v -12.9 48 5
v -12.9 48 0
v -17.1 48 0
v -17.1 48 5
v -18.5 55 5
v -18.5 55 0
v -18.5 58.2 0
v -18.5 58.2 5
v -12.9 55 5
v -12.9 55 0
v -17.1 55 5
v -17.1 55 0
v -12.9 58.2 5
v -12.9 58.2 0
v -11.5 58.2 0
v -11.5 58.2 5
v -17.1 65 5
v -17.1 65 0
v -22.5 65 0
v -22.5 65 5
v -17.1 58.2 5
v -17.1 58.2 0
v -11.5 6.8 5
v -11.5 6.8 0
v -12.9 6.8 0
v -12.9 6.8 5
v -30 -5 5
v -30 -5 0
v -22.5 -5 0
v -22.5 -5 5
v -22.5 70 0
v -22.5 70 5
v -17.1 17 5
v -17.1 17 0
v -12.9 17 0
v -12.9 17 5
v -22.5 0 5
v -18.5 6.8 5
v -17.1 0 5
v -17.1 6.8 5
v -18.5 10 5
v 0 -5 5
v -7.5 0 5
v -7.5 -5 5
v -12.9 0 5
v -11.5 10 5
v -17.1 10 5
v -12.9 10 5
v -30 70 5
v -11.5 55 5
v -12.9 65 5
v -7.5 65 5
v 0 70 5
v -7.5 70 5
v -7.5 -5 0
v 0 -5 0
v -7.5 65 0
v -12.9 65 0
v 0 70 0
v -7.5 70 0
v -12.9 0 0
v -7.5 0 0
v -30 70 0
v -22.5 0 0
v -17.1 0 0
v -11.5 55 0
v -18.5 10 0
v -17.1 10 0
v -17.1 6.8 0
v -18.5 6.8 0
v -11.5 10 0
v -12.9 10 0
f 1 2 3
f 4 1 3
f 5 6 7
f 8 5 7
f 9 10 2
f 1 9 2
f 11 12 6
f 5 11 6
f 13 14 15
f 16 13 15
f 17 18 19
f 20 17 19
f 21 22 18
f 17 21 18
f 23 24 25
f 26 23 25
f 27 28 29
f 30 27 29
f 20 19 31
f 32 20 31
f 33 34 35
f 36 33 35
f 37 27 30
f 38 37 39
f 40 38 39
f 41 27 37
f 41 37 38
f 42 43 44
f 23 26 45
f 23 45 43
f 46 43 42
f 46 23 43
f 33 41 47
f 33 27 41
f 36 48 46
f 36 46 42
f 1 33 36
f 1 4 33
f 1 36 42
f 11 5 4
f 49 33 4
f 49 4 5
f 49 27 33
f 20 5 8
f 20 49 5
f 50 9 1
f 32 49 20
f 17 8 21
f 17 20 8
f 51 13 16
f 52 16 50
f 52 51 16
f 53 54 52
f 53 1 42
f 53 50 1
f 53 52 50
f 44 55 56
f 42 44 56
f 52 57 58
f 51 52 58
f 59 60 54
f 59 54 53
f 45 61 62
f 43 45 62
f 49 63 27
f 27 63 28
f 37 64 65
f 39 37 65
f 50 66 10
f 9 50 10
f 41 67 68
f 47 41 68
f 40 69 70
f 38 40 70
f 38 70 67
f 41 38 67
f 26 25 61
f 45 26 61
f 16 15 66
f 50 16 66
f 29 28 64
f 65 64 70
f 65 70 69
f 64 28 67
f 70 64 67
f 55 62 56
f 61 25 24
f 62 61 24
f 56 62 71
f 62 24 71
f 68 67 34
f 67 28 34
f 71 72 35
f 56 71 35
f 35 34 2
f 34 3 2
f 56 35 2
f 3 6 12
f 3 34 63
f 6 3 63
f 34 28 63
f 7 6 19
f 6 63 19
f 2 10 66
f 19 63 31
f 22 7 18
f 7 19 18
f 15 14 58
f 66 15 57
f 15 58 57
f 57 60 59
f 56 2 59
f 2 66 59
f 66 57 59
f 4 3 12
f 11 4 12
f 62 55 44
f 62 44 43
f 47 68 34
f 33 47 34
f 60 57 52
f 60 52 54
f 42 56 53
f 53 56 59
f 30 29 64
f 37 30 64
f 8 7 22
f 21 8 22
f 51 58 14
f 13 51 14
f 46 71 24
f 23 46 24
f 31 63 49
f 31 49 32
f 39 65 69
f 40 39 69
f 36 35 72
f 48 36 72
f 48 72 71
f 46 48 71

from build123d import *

# Parameters (mm, degrees)
SKETCH1_W           = 7.5
SKETCH1_H           = 5
BOSS_EXTRUDE1_DEPTH = 5


with BuildPart() as part:
    # Sketch1 → Boss-Extrude1 (new body)
    with BuildSketch(Plane.XY):
        Polygon((-7.5, 0), (0, 0), (0, 65), (-7.5, 65), (-12.9, 65), (-12.9, 58.2), (-11.5, 58.2), (-11.5, 55), (-12.9, 55), (-12.9, 48), (-17.1, 48), (-17.1, 55), (-18.5, 55), (-18.5, 58.2), (-17.1, 58.2), (-17.1, 65), (-22.5, 65), (-30, 65), (-30, 0), (-22.5, 0), (-17.1, 0), (-17.1, 6.8), (-18.5, 6.8), (-18.5, 10), (-17.1, 10), (-17.1, 17), (-12.9, 17), (-12.9, 10), (-11.5, 10), (-11.5, 6.8), (-12.9, 6.8), (-12.9, 0), align=None)
        with Locations((-3.75, 67.5)):
            Rectangle(SKETCH1_W, SKETCH1_H)
        with Locations((-26.25, 67.5)):
            Rectangle(SKETCH1_W, SKETCH1_H)
        with Locations((-26.25, -2.5)):
            Rectangle(SKETCH1_W, SKETCH1_H)
        with Locations((-3.75, -2.5)):
            Rectangle(SKETCH1_W, SKETCH1_H)
    extrude(amount=BOSS_EXTRUDE1_DEPTH)


solid = part.part
